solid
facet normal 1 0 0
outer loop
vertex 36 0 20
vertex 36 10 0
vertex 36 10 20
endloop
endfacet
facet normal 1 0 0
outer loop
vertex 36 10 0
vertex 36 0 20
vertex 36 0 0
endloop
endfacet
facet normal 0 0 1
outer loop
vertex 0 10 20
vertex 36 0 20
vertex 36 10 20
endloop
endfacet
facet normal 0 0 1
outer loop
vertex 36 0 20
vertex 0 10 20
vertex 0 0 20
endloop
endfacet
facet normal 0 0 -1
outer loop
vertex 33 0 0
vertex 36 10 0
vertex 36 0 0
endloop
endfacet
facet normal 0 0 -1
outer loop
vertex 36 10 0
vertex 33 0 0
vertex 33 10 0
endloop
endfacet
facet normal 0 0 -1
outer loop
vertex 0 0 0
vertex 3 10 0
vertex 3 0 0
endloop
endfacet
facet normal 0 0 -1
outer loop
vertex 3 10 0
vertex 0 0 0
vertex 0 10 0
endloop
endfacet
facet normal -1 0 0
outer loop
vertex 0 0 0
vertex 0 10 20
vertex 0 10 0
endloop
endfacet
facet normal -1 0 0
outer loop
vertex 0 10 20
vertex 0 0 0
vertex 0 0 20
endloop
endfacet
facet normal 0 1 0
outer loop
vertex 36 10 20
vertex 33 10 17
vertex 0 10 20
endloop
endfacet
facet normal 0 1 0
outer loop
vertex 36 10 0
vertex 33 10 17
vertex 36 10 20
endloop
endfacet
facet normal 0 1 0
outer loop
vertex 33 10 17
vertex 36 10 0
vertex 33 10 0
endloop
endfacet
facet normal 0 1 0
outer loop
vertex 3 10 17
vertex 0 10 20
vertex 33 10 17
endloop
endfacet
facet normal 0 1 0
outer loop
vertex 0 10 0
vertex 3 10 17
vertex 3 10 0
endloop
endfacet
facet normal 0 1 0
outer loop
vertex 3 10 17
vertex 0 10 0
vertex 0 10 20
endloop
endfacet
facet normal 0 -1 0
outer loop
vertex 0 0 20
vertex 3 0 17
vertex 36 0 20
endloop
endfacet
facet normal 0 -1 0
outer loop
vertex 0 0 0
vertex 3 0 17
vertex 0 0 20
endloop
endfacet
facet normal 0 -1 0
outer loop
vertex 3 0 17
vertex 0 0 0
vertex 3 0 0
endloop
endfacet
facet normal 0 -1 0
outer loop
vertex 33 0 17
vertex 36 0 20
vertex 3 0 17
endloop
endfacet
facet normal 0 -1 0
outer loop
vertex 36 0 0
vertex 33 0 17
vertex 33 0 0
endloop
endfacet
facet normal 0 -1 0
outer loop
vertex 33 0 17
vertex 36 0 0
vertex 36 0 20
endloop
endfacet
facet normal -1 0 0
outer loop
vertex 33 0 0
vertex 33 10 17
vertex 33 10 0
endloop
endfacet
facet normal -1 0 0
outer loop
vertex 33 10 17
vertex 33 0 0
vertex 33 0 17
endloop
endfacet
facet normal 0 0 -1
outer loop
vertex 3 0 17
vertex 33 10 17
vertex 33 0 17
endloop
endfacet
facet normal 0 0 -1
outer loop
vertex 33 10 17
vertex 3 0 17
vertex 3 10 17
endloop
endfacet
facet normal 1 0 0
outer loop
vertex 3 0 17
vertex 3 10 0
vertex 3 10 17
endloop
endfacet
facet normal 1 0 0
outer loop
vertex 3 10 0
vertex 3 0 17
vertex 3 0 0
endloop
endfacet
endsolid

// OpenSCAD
difference() {
  cube([36, 10, 20]);
  translate([3, 0, 0])
    cube([30, 10, 17]);
}
